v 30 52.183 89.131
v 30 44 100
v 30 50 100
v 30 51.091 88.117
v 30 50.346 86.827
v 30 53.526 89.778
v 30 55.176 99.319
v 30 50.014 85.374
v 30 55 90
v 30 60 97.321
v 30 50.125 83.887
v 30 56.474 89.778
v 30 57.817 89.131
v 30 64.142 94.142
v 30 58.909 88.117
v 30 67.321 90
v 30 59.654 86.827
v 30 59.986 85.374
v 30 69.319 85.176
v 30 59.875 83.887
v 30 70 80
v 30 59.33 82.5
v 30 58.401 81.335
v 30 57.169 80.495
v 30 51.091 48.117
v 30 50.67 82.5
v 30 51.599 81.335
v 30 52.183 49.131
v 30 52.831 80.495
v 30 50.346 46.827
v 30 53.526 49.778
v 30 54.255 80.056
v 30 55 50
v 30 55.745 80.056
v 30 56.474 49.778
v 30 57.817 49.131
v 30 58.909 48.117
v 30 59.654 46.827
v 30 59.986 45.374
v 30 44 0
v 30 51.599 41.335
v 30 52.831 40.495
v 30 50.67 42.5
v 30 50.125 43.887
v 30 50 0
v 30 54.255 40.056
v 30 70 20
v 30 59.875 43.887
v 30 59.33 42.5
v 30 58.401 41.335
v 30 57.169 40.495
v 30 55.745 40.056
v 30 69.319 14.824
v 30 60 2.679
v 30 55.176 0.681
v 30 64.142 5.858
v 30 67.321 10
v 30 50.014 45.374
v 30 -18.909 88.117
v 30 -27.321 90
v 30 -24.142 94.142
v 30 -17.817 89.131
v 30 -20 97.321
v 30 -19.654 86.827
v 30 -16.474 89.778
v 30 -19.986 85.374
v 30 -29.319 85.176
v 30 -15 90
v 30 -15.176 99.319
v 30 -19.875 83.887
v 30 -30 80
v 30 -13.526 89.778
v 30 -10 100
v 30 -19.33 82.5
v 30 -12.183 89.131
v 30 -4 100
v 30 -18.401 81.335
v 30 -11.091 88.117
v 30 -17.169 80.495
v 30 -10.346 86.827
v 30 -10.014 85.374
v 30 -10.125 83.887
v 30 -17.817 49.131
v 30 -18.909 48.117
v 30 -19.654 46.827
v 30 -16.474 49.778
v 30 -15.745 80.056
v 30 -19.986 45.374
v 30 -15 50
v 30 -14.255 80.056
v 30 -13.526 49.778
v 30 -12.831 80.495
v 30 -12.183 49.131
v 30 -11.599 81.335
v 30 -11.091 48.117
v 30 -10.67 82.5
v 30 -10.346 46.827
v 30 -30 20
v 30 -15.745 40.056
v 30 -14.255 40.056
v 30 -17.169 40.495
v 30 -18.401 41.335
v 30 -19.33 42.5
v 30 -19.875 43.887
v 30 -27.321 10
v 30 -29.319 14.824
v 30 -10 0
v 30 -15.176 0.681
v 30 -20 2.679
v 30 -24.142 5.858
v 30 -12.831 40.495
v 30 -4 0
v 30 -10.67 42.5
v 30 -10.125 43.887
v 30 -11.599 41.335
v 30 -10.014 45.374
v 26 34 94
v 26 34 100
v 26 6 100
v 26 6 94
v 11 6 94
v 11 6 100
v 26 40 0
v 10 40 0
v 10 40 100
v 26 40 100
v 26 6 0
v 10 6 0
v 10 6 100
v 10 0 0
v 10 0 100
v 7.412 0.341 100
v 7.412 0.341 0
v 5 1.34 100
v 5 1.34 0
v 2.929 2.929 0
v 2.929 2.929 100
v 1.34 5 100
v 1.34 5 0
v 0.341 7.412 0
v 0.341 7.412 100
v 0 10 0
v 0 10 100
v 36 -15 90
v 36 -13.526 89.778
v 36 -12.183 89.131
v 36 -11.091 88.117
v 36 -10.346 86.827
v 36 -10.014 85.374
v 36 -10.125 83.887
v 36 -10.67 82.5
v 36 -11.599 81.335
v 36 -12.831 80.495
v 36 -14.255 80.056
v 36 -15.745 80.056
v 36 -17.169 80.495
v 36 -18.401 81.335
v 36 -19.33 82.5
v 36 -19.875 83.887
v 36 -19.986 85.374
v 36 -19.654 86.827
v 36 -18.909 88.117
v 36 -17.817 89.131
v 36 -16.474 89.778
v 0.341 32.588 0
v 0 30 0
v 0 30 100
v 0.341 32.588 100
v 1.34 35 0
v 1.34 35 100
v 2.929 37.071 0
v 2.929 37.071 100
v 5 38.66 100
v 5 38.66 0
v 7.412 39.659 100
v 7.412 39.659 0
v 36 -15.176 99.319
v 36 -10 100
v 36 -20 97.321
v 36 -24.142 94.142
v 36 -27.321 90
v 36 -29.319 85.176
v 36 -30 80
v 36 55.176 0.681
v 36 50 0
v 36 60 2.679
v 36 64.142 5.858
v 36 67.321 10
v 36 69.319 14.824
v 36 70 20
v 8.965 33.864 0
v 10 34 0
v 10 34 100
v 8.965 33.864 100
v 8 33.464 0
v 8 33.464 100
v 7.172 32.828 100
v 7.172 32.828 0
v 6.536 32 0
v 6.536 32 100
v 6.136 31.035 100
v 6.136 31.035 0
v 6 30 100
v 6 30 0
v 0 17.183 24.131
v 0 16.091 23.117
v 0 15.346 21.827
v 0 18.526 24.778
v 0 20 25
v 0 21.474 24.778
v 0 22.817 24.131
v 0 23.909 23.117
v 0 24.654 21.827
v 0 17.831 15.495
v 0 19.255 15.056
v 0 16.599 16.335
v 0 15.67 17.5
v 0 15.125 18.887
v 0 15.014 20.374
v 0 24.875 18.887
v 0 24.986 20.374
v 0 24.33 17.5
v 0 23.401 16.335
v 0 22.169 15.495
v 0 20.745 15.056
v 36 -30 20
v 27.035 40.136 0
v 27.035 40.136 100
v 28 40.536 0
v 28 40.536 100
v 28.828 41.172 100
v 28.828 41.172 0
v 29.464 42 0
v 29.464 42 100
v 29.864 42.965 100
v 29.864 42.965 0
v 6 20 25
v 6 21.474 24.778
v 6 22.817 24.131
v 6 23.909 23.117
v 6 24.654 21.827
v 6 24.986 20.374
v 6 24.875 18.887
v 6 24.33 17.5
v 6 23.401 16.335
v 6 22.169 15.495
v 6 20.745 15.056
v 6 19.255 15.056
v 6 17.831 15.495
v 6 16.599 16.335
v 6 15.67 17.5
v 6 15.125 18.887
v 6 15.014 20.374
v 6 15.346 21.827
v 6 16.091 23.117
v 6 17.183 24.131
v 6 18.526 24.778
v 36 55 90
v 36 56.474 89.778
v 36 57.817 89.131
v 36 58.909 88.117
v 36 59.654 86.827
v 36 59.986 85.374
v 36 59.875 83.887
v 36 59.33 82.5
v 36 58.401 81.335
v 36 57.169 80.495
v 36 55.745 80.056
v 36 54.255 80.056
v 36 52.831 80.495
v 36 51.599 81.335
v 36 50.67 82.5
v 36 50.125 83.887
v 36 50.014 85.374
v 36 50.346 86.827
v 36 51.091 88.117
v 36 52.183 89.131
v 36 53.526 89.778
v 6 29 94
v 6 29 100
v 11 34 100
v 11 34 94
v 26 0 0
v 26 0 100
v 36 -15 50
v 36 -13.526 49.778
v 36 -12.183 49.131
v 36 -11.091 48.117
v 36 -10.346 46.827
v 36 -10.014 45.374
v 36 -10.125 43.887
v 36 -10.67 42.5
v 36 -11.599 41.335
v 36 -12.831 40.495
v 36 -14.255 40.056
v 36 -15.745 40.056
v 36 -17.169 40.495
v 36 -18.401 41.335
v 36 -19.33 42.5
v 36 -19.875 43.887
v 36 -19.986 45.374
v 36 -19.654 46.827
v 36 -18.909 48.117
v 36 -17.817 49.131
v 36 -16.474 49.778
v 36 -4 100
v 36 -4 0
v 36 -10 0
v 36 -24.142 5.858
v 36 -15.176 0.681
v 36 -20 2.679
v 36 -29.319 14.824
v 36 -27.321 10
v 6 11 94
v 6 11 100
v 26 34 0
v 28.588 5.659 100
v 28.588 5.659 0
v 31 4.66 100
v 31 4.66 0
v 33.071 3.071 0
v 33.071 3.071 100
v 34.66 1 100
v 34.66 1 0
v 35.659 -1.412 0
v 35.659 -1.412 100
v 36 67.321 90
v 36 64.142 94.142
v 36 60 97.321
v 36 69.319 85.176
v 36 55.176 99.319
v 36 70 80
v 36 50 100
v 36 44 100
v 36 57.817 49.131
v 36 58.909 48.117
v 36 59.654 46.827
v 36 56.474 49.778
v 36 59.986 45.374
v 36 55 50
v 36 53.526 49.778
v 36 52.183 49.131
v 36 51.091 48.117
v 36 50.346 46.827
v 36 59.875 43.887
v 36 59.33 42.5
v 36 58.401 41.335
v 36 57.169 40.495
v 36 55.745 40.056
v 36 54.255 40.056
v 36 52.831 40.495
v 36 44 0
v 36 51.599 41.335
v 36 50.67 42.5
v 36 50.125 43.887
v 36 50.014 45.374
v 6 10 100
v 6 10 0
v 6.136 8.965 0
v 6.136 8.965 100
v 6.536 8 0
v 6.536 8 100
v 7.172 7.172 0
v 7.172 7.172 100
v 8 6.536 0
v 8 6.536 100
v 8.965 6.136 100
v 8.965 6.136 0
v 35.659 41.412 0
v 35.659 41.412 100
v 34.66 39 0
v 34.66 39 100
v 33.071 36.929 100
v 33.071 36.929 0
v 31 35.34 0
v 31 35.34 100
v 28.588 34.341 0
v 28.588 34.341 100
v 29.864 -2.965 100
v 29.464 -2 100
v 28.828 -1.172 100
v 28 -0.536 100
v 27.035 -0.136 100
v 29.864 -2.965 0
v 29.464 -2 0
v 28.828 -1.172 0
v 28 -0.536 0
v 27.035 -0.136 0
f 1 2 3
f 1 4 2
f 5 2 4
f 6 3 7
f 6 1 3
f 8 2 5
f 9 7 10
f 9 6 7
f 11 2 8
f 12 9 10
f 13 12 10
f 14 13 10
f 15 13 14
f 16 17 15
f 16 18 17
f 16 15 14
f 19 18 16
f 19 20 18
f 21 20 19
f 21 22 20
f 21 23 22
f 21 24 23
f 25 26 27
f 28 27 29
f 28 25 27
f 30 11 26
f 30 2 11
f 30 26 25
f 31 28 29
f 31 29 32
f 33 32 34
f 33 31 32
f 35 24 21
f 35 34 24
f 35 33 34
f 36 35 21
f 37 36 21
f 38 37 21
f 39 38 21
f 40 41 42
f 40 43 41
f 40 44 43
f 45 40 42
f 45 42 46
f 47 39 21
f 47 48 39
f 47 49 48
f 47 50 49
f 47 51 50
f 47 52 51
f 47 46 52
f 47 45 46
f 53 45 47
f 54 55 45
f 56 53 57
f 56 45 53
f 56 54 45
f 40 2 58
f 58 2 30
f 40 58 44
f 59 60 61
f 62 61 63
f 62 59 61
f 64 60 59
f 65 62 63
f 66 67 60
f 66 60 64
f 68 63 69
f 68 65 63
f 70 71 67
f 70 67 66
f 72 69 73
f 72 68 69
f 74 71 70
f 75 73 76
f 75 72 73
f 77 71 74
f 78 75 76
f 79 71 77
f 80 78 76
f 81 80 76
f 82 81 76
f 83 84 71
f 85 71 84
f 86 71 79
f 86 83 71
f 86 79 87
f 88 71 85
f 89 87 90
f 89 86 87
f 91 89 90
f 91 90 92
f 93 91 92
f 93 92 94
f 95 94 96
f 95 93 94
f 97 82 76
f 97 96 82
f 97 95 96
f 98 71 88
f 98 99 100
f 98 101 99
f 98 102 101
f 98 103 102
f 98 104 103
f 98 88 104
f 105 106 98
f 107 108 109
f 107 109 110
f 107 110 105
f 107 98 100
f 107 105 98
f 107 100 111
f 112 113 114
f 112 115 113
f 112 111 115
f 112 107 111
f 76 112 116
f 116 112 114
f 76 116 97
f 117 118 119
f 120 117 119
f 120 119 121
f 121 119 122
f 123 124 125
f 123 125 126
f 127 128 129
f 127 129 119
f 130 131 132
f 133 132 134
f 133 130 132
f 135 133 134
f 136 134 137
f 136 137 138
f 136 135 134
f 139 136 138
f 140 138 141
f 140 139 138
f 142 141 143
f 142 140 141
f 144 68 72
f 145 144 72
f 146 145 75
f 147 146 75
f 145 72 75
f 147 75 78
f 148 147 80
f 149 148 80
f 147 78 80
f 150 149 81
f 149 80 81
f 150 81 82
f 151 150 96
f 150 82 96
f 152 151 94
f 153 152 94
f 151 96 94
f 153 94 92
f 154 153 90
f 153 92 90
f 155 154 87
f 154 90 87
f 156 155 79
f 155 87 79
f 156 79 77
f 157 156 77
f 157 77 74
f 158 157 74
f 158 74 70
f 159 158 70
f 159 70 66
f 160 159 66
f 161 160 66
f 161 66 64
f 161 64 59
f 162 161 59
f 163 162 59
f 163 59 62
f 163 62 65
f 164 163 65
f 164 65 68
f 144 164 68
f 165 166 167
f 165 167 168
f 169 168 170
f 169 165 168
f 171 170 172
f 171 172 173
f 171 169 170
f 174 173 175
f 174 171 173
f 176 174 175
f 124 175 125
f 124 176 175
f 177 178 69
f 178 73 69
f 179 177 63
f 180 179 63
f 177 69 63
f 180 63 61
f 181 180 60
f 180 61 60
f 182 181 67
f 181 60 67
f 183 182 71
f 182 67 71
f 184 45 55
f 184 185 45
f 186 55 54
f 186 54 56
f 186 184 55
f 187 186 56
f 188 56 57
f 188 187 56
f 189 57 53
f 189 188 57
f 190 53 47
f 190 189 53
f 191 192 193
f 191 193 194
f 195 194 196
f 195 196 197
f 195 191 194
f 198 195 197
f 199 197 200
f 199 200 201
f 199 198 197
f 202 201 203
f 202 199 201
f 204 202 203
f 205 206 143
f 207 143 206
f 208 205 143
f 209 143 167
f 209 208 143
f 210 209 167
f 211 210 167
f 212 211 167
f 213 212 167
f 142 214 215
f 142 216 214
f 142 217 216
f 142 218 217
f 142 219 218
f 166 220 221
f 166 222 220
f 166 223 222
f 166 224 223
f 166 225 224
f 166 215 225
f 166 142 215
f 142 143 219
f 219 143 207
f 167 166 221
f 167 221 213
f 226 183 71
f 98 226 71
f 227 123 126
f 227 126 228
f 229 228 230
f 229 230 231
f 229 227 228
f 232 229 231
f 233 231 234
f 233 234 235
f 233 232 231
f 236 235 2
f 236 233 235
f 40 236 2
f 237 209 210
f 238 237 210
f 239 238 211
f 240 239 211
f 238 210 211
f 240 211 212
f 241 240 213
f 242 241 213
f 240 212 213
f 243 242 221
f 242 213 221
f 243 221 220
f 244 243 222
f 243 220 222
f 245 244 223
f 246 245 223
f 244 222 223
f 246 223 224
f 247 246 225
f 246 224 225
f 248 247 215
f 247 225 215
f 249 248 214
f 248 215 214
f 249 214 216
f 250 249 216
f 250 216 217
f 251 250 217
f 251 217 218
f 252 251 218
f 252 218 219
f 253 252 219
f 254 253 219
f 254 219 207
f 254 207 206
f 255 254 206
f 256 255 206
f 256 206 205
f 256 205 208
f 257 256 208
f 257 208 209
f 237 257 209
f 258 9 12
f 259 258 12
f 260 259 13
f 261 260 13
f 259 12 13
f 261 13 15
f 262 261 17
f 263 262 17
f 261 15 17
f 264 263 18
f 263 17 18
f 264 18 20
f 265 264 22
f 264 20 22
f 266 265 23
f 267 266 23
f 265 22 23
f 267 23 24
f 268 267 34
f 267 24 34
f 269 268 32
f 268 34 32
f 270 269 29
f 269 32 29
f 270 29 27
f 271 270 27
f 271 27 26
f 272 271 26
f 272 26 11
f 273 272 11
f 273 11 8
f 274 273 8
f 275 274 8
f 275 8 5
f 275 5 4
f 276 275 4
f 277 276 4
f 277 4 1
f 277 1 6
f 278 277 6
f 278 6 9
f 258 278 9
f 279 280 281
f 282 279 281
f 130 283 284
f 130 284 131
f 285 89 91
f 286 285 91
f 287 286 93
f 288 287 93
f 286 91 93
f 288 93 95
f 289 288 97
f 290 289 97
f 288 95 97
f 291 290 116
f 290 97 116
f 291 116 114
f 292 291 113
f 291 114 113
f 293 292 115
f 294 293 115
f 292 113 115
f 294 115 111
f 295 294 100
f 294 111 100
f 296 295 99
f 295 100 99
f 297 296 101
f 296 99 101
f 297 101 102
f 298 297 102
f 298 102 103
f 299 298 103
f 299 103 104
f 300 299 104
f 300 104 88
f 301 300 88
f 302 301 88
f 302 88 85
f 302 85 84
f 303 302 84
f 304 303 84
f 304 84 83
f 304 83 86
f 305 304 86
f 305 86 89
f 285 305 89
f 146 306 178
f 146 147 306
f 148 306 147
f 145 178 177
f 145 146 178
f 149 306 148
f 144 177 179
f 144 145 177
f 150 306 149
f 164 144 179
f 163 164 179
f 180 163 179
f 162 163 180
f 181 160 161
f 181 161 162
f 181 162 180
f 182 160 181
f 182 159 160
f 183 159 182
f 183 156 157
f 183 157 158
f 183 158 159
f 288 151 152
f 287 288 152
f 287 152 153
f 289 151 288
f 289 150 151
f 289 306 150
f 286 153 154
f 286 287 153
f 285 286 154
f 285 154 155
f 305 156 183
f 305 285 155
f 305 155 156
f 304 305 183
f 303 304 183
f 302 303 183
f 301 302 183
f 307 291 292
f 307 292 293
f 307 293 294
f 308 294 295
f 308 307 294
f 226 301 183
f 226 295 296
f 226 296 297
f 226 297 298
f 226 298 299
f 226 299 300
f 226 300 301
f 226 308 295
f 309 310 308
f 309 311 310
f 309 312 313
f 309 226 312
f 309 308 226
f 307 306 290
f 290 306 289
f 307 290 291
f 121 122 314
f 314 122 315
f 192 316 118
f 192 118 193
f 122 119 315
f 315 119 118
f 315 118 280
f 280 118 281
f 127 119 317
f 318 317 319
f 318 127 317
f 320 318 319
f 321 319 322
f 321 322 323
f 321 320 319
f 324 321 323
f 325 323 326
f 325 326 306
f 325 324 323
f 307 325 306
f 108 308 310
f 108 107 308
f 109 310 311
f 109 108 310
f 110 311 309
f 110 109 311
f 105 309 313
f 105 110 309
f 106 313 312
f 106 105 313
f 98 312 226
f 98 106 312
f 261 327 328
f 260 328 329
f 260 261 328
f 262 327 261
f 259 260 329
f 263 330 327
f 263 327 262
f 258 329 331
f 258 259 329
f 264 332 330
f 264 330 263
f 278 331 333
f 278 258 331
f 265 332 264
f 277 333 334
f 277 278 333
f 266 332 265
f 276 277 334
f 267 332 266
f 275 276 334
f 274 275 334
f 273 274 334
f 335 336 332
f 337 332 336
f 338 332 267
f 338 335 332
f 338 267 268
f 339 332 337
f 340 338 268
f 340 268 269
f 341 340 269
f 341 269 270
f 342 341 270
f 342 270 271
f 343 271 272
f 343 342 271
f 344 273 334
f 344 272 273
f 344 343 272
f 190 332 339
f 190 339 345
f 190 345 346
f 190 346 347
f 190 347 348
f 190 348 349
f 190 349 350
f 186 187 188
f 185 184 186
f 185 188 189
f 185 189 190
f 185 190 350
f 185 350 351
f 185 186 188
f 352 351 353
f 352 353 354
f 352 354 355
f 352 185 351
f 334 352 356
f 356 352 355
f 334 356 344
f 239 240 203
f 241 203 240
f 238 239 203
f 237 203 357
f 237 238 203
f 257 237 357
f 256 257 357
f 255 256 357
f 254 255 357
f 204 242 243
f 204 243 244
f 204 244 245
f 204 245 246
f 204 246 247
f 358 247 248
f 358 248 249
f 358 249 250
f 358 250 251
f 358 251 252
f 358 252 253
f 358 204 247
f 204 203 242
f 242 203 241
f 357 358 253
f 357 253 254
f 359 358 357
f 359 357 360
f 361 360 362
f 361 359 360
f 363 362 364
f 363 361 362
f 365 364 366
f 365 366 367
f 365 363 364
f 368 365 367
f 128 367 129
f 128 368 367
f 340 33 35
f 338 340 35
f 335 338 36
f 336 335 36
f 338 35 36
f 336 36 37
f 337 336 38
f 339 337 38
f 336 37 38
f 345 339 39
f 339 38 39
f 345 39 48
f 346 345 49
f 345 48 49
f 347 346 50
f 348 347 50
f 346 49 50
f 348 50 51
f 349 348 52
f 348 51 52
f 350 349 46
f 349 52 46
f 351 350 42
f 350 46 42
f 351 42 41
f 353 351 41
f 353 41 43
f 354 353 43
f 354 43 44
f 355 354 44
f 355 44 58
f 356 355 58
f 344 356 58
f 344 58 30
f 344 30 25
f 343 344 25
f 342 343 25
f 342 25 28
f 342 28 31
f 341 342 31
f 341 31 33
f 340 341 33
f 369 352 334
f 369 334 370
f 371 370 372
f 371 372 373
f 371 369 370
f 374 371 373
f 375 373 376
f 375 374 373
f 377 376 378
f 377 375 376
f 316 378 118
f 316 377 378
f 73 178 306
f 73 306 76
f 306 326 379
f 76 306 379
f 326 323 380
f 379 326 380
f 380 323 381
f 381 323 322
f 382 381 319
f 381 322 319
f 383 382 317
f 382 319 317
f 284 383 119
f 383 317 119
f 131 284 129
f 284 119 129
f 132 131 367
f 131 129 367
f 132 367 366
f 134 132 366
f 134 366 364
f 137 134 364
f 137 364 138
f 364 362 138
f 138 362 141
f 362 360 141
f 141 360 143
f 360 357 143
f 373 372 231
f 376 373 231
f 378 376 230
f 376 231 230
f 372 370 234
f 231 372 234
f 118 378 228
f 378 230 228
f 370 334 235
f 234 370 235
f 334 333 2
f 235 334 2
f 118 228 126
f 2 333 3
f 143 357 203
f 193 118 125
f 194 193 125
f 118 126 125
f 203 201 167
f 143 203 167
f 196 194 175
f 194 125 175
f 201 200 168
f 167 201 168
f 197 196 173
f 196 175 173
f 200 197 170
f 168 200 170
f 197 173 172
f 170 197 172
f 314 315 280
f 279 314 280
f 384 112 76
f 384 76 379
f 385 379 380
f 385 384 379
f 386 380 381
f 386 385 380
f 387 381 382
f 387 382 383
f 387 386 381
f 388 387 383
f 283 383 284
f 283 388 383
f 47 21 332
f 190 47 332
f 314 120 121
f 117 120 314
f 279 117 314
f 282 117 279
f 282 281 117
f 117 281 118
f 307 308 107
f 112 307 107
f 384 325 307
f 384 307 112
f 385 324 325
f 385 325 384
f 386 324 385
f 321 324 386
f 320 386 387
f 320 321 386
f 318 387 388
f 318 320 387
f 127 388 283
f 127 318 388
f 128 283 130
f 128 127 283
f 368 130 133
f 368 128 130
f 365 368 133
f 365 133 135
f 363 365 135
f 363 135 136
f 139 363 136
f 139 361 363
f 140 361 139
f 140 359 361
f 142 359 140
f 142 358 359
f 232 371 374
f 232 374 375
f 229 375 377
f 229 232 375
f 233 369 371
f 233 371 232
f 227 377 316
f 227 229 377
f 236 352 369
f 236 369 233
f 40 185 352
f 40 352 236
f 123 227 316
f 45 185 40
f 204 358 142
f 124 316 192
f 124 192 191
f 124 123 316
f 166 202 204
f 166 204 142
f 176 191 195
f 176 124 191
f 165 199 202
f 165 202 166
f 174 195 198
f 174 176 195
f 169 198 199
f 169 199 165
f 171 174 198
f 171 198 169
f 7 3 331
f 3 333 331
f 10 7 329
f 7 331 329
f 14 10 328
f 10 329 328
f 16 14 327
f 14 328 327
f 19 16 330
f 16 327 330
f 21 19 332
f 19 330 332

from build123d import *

# Parameters (mm, degrees)
EXTRUDE_1_DEPTH     = 100
CUT_EXTRUDE_1_REACH = 38
SKETCH_2_R          = 5
CUT_EXTRUDE_2_REACH = 8
SKETCH_3_R          = 5
EXTRUDE_2_DEPTH     = 6
FILLET_1_R          = 20


with BuildPart() as part:
    # 草图1 → 凸台-拉伸1 (new body)
    with BuildSketch(Plane.XY):
        with BuildLine():
            Line((0, 10), (0, 30))
            ThreePointArc((0, 30), (2.928932188, 37.071067812), (10, 40))
            Line((10, 40), (26, 40))
            ThreePointArc((26, 40), (28.828427125, 41.171572875), (30, 44))
            Line((30, 44), (30, 70))
            Line((30, 70), (36, 70))
            Line((36, 70), (36, 44))
            ThreePointArc((36, 44), (33.071067812, 36.928932188), (26, 34))
            Line((26, 34), (10, 34))
            ThreePointArc((10, 34), (7.171572875, 32.828427125), (6, 30))
            Line((6, 30), (6, 10))
            ThreePointArc((6, 10), (7.171572875, 7.171572875), (10, 6))
            Line((10, 6), (26, 6))
            ThreePointArc((26, 6), (33.071067812, 3.071067812), (36, -4))
            Line((36, -4), (36, -30))
            Line((36, -30), (30, -30))
            Line((30, -30), (30, -4))
            ThreePointArc((30, -4), (28.828427125, -1.171572875), (26, 0))
            Line((26, 0), (10, 0))
            ThreePointArc((10, 0), (2.928932188, 2.928932188), (0, 10))
        make_face()
    extrude(amount=EXTRUDE_1_DEPTH)

    # 草图2 → 切除-拉伸1 (cut, up to next)
    with BuildSketch(Plane.ZY, mode=Mode.PRIVATE) as cut_extrude_1_sk1:
        with Locations((20, 20)):
            Circle(SKETCH_2_R)
    cut_extrude_1_tool1 = extrude(cut_extrude_1_sk1.sketch, amount=-CUT_EXTRUDE_1_REACH, mode=Mode.PRIVATE) & part.part
    add(cut_extrude_1_tool1.solids().sort_by_distance((0, 20, 20))[0], mode=Mode.SUBTRACT)

    # 草图3 → 切除-拉伸2 (cut, up to next)
    with BuildSketch(Plane.ZY.offset(-30), mode=Mode.PRIVATE) as cut_extrude_2_sk1:
        with Locations((85, 55)):
            Circle(SKETCH_3_R)
    cut_extrude_2_tool1 = extrude(cut_extrude_2_sk1.sketch, amount=-CUT_EXTRUDE_2_REACH, mode=Mode.PRIVATE) & part.part
    add(cut_extrude_2_tool1.solids().sort_by_distance((30, 55, 85))[0], mode=Mode.SUBTRACT)
    # 草图3 → 切除-拉伸2 (cut, up to next)
    with BuildSketch(Plane.ZY.offset(-30), mode=Mode.PRIVATE) as cut_extrude_2_sk2:
        with Locations((45, 55)):
            Circle(SKETCH_3_R)
    cut_extrude_2_tool2 = extrude(cut_extrude_2_sk2.sketch, amount=-CUT_EXTRUDE_2_REACH, mode=Mode.PRIVATE) & part.part
    add(cut_extrude_2_tool2.solids().sort_by_distance((30, 55, 45))[0], mode=Mode.SUBTRACT)
    # 草图3 → 切除-拉伸2 (cut, up to next)
    with BuildSketch(Plane.ZY.offset(-30), mode=Mode.PRIVATE) as cut_extrude_2_sk3:
        with Locations((45, -15)):
            Circle(SKETCH_3_R)
    cut_extrude_2_tool3 = extrude(cut_extrude_2_sk3.sketch, amount=-CUT_EXTRUDE_2_REACH, mode=Mode.PRIVATE) & part.part
    add(cut_extrude_2_tool3.solids().sort_by_distance((30, -15, 45))[0], mode=Mode.SUBTRACT)
    # 草图3 → 切除-拉伸2 (cut, up to next)
    with BuildSketch(Plane.ZY.offset(-30), mode=Mode.PRIVATE) as cut_extrude_2_sk4:
        with Locations((85, -15)):
            Circle(SKETCH_3_R)
    cut_extrude_2_tool4 = extrude(cut_extrude_2_sk4.sketch, amount=-CUT_EXTRUDE_2_REACH, mode=Mode.PRIVATE) & part.part
    add(cut_extrude_2_tool4.solids().sort_by_distance((30, -15, 85))[0], mode=Mode.SUBTRACT)

    # 圆角1
    fillet_1_edges = [part.edges().sort_by_distance(p)[0] for p in [
        (33, -30, 100),
        (33, 70, 0),
        (33, -30, 0),
        (33, 70, 100),
    ]]
    fillet(fillet_1_edges, radius=FILLET_1_R)


with BuildPart() as body_2:
    # 草图4 → 凸台-拉伸2 (new body)
    with BuildSketch(Plane.XY.offset(100)):
        Polygon((11, 34), (26, 34), (26, 6), (11, 6), (6, 11), (6, 29), align=None)
    extrude(amount=-EXTRUDE_2_DEPTH)


solid = Compound([part.part, body_2.part])
